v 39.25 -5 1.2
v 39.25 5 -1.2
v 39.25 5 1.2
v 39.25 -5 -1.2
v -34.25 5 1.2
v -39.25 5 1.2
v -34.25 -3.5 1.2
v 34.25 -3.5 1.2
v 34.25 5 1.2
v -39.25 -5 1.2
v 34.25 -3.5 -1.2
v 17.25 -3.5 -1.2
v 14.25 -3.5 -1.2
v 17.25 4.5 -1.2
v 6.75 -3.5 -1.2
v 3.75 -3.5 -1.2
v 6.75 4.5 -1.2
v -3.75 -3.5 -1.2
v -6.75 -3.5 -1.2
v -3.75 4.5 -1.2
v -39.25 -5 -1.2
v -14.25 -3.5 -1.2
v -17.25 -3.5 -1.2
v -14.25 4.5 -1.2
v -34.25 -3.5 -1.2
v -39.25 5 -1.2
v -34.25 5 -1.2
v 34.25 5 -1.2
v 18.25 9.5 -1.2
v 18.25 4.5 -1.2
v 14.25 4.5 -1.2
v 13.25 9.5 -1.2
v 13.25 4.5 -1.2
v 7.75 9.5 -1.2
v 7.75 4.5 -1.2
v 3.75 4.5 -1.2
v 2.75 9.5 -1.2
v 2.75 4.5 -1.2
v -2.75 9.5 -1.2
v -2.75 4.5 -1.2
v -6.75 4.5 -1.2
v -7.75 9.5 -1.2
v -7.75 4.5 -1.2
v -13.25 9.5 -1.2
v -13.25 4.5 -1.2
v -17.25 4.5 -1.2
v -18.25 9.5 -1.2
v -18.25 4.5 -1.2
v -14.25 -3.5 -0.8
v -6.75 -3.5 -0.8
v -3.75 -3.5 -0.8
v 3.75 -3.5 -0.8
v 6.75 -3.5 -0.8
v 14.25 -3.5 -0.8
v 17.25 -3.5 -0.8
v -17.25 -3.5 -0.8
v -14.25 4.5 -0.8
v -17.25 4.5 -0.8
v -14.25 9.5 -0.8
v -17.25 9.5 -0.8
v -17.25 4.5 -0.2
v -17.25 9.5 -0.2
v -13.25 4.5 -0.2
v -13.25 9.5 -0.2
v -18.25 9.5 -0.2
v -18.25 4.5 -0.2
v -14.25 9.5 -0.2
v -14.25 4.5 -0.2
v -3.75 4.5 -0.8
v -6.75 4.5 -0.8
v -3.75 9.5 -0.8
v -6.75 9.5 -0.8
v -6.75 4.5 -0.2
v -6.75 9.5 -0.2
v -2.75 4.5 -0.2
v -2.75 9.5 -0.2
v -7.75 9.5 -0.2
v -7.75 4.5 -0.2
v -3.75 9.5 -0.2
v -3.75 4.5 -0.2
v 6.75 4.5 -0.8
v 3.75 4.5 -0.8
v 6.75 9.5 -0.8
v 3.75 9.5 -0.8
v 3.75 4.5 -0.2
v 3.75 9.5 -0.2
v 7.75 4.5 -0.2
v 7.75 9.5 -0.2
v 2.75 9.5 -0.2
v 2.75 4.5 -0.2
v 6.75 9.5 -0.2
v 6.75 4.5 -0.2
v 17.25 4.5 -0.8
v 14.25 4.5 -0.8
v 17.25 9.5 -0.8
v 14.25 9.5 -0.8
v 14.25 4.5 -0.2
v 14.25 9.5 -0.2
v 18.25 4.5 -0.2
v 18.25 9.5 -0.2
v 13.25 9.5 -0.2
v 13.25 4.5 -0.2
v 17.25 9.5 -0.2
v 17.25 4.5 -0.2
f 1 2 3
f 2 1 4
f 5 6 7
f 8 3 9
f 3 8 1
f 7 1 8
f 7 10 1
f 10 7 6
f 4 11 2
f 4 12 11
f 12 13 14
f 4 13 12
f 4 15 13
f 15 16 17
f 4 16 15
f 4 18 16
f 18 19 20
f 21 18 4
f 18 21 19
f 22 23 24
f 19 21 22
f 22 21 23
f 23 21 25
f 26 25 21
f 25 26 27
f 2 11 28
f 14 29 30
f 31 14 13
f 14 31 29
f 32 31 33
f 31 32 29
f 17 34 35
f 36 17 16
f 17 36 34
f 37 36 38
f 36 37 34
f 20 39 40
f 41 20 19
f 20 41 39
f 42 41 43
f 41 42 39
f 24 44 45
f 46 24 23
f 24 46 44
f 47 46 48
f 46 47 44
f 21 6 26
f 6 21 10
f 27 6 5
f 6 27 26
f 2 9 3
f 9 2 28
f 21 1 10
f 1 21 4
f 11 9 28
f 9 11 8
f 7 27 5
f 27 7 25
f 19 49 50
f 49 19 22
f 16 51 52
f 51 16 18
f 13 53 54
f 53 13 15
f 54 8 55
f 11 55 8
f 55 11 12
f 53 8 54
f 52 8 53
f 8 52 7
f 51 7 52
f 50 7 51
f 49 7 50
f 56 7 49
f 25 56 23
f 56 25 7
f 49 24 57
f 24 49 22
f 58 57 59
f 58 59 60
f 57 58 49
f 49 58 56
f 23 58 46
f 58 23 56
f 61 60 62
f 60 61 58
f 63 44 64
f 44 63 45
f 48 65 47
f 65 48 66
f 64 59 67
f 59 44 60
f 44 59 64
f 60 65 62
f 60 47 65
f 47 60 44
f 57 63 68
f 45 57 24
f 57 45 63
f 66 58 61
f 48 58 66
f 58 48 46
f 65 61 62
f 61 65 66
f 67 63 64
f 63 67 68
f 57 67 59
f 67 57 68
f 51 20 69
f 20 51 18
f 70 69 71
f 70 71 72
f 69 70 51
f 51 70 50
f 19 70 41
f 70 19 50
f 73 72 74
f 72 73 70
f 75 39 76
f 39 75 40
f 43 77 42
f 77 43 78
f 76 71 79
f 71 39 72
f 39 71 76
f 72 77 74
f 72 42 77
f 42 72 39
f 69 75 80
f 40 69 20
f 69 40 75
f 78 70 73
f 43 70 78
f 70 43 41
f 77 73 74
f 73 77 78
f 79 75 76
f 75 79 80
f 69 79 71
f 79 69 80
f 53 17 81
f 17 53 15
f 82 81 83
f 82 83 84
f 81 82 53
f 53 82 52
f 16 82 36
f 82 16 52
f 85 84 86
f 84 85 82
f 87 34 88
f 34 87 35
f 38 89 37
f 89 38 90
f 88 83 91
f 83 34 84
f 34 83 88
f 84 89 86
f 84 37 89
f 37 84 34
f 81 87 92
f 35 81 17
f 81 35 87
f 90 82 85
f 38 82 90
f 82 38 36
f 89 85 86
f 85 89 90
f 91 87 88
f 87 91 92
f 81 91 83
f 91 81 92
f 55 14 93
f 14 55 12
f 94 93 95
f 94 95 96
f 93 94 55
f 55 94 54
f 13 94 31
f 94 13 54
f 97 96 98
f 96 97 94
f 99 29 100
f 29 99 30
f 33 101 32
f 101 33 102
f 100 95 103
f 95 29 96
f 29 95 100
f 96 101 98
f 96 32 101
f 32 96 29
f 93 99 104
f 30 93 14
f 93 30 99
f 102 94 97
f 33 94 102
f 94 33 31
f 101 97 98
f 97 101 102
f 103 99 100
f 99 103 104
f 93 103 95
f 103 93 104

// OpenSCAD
module pintang()
{
    cube(size=[3,9,0.4],center=true);

    translate(v=[0,6,0])
      cube(size=[5,5,0.4],center=true);

    translate(v=[-2,6,0.4])
      cube(size=[1,5,0.8],center=true);

    translate(v=[2,6,0.4])
      cube(size=[1,5,0.8],center=true);
}

union()
{
  difference()
  {
    cube(size=[6*(6+4.5)+4.5+1+10,10,2.4],center=true);

    translate(v=[0,1.5,0])
      cube(size=[6*(6+4.5)+4.5+1,10,2.4],center=true);
  }

  translate(v=[-15.75,1,-1.0]) pintang();

  translate(v=[-5.25,1,-1.0]) pintang();

  translate(v=[5.25,1,-1.0]) pintang();

  translate(v=[15.75,1,-1.0]) pintang();
}
